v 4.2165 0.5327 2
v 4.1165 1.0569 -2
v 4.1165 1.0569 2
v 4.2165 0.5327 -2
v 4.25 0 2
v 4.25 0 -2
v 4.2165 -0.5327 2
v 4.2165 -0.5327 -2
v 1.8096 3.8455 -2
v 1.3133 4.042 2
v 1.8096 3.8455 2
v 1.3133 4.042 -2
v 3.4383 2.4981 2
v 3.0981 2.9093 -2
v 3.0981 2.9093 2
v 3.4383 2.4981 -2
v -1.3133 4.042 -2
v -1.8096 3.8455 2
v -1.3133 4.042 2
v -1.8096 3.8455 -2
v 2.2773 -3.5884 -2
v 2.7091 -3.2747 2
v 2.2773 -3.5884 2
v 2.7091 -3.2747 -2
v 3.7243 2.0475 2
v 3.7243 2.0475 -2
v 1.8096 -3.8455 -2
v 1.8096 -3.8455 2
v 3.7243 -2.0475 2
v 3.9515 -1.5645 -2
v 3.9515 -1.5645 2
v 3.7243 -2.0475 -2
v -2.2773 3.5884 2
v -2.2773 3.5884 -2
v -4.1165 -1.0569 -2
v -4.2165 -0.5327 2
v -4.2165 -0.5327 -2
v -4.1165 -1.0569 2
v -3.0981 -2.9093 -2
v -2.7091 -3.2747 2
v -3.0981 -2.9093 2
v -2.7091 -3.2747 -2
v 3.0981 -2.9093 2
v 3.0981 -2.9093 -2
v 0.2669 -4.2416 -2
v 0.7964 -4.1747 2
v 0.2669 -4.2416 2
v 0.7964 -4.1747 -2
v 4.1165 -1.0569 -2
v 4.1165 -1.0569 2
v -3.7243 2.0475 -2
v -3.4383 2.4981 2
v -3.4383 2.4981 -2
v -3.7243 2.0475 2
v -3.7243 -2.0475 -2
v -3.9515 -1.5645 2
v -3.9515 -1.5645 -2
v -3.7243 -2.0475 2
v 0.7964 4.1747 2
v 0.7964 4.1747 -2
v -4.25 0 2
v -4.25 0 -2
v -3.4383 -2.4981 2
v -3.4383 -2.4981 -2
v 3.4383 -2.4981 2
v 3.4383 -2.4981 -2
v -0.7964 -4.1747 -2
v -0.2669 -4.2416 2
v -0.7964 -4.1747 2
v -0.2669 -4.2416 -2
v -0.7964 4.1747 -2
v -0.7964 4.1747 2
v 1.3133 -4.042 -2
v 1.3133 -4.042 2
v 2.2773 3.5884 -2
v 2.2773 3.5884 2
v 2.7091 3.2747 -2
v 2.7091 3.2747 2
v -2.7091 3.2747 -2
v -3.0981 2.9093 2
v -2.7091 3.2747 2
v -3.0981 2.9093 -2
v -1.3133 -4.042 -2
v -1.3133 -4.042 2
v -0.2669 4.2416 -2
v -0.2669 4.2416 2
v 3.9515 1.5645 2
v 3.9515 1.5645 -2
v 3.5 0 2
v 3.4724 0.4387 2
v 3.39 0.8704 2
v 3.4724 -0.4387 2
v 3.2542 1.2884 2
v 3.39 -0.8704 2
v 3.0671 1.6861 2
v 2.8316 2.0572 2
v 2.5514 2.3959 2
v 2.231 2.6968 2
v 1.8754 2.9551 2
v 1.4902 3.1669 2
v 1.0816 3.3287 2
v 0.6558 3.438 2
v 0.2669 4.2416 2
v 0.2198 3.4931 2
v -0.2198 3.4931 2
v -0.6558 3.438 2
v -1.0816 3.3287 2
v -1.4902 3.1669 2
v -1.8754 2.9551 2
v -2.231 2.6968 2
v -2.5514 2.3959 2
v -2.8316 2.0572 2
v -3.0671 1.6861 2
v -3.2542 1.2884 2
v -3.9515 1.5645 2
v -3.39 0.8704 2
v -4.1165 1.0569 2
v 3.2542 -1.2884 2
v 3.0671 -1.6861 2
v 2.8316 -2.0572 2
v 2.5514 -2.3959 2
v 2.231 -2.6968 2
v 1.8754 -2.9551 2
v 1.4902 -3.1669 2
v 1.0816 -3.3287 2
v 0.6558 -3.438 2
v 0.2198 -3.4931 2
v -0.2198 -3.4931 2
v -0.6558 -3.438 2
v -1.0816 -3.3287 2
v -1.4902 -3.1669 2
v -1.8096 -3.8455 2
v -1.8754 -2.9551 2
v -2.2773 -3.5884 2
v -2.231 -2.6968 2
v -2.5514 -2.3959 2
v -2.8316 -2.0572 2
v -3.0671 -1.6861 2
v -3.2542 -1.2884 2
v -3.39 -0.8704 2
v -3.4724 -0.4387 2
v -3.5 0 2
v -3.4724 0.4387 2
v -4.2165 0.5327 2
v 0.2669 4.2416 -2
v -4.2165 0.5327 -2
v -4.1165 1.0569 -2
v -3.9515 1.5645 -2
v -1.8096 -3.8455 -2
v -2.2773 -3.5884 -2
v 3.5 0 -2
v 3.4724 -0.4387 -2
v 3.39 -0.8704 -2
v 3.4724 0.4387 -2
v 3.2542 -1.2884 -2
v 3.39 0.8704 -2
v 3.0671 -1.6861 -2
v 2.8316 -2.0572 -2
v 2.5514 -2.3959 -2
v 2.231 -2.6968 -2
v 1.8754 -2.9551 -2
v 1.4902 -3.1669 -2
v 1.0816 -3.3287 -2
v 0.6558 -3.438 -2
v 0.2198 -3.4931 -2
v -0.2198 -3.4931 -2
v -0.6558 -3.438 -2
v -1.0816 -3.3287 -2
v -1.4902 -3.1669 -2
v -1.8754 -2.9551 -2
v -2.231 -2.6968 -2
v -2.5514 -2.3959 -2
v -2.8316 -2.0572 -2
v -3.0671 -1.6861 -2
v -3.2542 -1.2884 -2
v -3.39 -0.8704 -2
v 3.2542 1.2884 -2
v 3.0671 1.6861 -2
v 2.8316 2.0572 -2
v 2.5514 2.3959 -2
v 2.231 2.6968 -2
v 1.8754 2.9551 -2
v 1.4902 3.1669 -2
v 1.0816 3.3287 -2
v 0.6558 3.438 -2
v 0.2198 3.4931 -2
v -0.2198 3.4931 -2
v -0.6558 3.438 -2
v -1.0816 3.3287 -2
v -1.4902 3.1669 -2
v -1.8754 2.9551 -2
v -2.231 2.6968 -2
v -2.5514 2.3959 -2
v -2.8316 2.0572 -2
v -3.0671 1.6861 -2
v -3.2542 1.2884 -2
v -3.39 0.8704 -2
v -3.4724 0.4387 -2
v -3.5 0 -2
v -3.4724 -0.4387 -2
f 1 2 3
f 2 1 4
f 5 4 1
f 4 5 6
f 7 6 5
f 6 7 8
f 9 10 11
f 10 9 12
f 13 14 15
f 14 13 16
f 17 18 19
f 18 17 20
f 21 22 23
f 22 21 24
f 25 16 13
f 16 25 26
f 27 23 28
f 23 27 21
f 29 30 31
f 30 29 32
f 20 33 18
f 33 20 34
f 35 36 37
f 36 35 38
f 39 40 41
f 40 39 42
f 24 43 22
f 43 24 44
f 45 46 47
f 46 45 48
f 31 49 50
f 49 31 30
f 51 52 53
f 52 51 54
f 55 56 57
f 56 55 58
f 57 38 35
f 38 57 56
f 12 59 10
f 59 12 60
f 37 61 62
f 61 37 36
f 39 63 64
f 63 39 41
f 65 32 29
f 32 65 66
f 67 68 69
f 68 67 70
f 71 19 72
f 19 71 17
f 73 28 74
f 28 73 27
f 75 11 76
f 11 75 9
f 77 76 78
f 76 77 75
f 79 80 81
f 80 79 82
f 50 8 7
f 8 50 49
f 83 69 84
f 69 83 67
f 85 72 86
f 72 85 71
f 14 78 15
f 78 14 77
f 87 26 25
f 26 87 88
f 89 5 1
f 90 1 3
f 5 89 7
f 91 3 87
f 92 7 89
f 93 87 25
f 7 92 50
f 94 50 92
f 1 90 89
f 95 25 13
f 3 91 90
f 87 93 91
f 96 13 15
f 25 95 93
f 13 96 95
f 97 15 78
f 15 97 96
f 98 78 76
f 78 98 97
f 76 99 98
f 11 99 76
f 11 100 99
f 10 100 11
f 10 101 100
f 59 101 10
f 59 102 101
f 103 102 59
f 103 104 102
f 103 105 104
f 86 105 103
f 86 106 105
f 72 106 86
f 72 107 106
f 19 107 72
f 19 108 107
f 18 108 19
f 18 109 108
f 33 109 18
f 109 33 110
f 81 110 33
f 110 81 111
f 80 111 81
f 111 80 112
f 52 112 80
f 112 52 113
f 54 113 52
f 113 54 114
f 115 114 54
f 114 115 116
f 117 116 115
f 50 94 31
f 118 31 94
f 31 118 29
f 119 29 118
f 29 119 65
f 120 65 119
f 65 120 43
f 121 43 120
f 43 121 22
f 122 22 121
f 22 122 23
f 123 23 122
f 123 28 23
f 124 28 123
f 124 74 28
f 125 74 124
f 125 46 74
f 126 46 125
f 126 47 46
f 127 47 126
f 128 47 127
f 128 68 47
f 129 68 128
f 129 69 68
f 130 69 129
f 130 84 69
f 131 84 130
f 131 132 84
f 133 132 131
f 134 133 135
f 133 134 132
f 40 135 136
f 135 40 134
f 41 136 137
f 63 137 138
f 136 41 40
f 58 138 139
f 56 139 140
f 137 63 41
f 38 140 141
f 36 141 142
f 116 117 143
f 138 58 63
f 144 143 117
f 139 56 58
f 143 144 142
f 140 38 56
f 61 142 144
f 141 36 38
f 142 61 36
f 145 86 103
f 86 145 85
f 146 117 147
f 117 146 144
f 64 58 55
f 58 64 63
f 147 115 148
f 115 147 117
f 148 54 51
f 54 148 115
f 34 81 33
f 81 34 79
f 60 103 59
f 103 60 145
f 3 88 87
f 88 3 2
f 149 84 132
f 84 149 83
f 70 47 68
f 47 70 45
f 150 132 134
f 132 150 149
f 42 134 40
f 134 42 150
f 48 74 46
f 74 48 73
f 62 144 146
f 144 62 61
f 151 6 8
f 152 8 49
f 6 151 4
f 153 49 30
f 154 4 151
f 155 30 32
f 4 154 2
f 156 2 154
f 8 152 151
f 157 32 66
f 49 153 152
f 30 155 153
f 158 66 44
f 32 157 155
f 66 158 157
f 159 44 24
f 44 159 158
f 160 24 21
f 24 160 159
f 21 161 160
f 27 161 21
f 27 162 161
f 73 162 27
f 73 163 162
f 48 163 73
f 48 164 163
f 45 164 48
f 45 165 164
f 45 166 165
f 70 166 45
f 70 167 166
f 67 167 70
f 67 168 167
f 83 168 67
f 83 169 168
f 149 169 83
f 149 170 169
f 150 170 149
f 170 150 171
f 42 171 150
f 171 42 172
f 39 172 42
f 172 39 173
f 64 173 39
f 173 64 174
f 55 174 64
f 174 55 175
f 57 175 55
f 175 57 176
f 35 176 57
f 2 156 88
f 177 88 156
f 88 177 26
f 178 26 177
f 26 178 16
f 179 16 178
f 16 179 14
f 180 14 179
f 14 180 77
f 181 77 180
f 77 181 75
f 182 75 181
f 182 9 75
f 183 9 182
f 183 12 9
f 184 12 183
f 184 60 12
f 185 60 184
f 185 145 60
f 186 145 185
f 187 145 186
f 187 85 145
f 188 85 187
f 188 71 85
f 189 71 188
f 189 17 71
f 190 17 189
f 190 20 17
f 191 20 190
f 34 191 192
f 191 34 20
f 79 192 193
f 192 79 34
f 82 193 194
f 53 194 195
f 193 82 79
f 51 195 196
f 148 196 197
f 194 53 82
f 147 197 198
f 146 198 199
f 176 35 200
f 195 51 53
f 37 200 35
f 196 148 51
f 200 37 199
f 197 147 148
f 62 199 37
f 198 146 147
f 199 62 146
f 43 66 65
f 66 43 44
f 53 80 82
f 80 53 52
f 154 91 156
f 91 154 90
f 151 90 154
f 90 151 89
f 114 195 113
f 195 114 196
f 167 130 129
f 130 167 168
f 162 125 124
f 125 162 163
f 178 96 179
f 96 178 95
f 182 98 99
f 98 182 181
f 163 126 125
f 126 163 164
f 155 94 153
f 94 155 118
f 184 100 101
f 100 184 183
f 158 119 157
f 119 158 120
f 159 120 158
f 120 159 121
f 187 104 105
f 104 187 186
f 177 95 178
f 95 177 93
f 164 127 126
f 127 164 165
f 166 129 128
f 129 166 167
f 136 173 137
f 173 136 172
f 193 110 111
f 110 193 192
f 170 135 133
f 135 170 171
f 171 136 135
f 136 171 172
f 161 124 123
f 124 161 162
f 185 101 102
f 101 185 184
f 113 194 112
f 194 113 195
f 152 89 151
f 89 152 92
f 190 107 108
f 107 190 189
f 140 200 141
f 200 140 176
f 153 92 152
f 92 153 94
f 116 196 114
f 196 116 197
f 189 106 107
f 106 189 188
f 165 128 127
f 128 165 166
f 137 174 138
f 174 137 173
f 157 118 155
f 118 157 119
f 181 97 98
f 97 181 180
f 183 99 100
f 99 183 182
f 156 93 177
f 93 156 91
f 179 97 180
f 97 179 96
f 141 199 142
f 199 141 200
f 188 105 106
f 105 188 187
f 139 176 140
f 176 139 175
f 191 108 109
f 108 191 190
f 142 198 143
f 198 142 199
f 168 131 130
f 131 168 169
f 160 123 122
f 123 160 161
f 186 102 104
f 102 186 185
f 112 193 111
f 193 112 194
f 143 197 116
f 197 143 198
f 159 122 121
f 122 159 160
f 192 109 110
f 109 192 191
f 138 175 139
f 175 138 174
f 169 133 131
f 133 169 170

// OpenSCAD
$fn = 50;


difference() {
	union() {
		translate(v = [0, 0, -2.0000000000]) {
			cylinder(h = 4, r = 4.2500000000);
		}
	}
	union() {
		translate(v = [0, 0, -100.0000000000]) {
			cylinder(h = 200, r = 3.5000000000);
		}
	}
}
